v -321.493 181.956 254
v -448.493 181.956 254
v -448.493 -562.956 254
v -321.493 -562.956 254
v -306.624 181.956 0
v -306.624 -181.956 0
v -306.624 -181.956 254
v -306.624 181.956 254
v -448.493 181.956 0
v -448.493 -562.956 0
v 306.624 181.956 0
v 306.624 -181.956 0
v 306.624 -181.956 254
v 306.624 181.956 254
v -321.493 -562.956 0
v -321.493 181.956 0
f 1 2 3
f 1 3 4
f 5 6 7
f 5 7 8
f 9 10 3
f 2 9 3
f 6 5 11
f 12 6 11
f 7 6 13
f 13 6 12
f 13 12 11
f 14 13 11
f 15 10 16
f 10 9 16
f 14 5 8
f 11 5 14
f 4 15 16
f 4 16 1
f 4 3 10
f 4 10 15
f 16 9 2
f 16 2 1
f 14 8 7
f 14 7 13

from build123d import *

# Parameters (mm, degrees)
F0_W      = 127
F0_H      = 363.911868
F0_W_2    = 613.248868
F1_DEPTH  = 254
F1_FACE_W = 127
F1_FACE_H = 254
F2_DEPTH  = 381


with BuildPart() as f1:
    # F0 (on Top) → F1 (new body)
    with BuildSketch(Plane.XY):
        with Locations((-384.992974, 0)):
            Rectangle(F0_W, F0_H)
        Rectangle(F0_W_2, F0_H)
    extrude(amount=F1_DEPTH)

    # F1_face (on face) → F2 (join)
    with BuildSketch(Plane(origin=(-384.992974, -181.955934, 127), x_dir=(1, 0, 0), z_dir=(0, -1, 0))):
        Rectangle(F1_FACE_W, F1_FACE_H)
    extrude(amount=F2_DEPTH)


solid = f1.part
